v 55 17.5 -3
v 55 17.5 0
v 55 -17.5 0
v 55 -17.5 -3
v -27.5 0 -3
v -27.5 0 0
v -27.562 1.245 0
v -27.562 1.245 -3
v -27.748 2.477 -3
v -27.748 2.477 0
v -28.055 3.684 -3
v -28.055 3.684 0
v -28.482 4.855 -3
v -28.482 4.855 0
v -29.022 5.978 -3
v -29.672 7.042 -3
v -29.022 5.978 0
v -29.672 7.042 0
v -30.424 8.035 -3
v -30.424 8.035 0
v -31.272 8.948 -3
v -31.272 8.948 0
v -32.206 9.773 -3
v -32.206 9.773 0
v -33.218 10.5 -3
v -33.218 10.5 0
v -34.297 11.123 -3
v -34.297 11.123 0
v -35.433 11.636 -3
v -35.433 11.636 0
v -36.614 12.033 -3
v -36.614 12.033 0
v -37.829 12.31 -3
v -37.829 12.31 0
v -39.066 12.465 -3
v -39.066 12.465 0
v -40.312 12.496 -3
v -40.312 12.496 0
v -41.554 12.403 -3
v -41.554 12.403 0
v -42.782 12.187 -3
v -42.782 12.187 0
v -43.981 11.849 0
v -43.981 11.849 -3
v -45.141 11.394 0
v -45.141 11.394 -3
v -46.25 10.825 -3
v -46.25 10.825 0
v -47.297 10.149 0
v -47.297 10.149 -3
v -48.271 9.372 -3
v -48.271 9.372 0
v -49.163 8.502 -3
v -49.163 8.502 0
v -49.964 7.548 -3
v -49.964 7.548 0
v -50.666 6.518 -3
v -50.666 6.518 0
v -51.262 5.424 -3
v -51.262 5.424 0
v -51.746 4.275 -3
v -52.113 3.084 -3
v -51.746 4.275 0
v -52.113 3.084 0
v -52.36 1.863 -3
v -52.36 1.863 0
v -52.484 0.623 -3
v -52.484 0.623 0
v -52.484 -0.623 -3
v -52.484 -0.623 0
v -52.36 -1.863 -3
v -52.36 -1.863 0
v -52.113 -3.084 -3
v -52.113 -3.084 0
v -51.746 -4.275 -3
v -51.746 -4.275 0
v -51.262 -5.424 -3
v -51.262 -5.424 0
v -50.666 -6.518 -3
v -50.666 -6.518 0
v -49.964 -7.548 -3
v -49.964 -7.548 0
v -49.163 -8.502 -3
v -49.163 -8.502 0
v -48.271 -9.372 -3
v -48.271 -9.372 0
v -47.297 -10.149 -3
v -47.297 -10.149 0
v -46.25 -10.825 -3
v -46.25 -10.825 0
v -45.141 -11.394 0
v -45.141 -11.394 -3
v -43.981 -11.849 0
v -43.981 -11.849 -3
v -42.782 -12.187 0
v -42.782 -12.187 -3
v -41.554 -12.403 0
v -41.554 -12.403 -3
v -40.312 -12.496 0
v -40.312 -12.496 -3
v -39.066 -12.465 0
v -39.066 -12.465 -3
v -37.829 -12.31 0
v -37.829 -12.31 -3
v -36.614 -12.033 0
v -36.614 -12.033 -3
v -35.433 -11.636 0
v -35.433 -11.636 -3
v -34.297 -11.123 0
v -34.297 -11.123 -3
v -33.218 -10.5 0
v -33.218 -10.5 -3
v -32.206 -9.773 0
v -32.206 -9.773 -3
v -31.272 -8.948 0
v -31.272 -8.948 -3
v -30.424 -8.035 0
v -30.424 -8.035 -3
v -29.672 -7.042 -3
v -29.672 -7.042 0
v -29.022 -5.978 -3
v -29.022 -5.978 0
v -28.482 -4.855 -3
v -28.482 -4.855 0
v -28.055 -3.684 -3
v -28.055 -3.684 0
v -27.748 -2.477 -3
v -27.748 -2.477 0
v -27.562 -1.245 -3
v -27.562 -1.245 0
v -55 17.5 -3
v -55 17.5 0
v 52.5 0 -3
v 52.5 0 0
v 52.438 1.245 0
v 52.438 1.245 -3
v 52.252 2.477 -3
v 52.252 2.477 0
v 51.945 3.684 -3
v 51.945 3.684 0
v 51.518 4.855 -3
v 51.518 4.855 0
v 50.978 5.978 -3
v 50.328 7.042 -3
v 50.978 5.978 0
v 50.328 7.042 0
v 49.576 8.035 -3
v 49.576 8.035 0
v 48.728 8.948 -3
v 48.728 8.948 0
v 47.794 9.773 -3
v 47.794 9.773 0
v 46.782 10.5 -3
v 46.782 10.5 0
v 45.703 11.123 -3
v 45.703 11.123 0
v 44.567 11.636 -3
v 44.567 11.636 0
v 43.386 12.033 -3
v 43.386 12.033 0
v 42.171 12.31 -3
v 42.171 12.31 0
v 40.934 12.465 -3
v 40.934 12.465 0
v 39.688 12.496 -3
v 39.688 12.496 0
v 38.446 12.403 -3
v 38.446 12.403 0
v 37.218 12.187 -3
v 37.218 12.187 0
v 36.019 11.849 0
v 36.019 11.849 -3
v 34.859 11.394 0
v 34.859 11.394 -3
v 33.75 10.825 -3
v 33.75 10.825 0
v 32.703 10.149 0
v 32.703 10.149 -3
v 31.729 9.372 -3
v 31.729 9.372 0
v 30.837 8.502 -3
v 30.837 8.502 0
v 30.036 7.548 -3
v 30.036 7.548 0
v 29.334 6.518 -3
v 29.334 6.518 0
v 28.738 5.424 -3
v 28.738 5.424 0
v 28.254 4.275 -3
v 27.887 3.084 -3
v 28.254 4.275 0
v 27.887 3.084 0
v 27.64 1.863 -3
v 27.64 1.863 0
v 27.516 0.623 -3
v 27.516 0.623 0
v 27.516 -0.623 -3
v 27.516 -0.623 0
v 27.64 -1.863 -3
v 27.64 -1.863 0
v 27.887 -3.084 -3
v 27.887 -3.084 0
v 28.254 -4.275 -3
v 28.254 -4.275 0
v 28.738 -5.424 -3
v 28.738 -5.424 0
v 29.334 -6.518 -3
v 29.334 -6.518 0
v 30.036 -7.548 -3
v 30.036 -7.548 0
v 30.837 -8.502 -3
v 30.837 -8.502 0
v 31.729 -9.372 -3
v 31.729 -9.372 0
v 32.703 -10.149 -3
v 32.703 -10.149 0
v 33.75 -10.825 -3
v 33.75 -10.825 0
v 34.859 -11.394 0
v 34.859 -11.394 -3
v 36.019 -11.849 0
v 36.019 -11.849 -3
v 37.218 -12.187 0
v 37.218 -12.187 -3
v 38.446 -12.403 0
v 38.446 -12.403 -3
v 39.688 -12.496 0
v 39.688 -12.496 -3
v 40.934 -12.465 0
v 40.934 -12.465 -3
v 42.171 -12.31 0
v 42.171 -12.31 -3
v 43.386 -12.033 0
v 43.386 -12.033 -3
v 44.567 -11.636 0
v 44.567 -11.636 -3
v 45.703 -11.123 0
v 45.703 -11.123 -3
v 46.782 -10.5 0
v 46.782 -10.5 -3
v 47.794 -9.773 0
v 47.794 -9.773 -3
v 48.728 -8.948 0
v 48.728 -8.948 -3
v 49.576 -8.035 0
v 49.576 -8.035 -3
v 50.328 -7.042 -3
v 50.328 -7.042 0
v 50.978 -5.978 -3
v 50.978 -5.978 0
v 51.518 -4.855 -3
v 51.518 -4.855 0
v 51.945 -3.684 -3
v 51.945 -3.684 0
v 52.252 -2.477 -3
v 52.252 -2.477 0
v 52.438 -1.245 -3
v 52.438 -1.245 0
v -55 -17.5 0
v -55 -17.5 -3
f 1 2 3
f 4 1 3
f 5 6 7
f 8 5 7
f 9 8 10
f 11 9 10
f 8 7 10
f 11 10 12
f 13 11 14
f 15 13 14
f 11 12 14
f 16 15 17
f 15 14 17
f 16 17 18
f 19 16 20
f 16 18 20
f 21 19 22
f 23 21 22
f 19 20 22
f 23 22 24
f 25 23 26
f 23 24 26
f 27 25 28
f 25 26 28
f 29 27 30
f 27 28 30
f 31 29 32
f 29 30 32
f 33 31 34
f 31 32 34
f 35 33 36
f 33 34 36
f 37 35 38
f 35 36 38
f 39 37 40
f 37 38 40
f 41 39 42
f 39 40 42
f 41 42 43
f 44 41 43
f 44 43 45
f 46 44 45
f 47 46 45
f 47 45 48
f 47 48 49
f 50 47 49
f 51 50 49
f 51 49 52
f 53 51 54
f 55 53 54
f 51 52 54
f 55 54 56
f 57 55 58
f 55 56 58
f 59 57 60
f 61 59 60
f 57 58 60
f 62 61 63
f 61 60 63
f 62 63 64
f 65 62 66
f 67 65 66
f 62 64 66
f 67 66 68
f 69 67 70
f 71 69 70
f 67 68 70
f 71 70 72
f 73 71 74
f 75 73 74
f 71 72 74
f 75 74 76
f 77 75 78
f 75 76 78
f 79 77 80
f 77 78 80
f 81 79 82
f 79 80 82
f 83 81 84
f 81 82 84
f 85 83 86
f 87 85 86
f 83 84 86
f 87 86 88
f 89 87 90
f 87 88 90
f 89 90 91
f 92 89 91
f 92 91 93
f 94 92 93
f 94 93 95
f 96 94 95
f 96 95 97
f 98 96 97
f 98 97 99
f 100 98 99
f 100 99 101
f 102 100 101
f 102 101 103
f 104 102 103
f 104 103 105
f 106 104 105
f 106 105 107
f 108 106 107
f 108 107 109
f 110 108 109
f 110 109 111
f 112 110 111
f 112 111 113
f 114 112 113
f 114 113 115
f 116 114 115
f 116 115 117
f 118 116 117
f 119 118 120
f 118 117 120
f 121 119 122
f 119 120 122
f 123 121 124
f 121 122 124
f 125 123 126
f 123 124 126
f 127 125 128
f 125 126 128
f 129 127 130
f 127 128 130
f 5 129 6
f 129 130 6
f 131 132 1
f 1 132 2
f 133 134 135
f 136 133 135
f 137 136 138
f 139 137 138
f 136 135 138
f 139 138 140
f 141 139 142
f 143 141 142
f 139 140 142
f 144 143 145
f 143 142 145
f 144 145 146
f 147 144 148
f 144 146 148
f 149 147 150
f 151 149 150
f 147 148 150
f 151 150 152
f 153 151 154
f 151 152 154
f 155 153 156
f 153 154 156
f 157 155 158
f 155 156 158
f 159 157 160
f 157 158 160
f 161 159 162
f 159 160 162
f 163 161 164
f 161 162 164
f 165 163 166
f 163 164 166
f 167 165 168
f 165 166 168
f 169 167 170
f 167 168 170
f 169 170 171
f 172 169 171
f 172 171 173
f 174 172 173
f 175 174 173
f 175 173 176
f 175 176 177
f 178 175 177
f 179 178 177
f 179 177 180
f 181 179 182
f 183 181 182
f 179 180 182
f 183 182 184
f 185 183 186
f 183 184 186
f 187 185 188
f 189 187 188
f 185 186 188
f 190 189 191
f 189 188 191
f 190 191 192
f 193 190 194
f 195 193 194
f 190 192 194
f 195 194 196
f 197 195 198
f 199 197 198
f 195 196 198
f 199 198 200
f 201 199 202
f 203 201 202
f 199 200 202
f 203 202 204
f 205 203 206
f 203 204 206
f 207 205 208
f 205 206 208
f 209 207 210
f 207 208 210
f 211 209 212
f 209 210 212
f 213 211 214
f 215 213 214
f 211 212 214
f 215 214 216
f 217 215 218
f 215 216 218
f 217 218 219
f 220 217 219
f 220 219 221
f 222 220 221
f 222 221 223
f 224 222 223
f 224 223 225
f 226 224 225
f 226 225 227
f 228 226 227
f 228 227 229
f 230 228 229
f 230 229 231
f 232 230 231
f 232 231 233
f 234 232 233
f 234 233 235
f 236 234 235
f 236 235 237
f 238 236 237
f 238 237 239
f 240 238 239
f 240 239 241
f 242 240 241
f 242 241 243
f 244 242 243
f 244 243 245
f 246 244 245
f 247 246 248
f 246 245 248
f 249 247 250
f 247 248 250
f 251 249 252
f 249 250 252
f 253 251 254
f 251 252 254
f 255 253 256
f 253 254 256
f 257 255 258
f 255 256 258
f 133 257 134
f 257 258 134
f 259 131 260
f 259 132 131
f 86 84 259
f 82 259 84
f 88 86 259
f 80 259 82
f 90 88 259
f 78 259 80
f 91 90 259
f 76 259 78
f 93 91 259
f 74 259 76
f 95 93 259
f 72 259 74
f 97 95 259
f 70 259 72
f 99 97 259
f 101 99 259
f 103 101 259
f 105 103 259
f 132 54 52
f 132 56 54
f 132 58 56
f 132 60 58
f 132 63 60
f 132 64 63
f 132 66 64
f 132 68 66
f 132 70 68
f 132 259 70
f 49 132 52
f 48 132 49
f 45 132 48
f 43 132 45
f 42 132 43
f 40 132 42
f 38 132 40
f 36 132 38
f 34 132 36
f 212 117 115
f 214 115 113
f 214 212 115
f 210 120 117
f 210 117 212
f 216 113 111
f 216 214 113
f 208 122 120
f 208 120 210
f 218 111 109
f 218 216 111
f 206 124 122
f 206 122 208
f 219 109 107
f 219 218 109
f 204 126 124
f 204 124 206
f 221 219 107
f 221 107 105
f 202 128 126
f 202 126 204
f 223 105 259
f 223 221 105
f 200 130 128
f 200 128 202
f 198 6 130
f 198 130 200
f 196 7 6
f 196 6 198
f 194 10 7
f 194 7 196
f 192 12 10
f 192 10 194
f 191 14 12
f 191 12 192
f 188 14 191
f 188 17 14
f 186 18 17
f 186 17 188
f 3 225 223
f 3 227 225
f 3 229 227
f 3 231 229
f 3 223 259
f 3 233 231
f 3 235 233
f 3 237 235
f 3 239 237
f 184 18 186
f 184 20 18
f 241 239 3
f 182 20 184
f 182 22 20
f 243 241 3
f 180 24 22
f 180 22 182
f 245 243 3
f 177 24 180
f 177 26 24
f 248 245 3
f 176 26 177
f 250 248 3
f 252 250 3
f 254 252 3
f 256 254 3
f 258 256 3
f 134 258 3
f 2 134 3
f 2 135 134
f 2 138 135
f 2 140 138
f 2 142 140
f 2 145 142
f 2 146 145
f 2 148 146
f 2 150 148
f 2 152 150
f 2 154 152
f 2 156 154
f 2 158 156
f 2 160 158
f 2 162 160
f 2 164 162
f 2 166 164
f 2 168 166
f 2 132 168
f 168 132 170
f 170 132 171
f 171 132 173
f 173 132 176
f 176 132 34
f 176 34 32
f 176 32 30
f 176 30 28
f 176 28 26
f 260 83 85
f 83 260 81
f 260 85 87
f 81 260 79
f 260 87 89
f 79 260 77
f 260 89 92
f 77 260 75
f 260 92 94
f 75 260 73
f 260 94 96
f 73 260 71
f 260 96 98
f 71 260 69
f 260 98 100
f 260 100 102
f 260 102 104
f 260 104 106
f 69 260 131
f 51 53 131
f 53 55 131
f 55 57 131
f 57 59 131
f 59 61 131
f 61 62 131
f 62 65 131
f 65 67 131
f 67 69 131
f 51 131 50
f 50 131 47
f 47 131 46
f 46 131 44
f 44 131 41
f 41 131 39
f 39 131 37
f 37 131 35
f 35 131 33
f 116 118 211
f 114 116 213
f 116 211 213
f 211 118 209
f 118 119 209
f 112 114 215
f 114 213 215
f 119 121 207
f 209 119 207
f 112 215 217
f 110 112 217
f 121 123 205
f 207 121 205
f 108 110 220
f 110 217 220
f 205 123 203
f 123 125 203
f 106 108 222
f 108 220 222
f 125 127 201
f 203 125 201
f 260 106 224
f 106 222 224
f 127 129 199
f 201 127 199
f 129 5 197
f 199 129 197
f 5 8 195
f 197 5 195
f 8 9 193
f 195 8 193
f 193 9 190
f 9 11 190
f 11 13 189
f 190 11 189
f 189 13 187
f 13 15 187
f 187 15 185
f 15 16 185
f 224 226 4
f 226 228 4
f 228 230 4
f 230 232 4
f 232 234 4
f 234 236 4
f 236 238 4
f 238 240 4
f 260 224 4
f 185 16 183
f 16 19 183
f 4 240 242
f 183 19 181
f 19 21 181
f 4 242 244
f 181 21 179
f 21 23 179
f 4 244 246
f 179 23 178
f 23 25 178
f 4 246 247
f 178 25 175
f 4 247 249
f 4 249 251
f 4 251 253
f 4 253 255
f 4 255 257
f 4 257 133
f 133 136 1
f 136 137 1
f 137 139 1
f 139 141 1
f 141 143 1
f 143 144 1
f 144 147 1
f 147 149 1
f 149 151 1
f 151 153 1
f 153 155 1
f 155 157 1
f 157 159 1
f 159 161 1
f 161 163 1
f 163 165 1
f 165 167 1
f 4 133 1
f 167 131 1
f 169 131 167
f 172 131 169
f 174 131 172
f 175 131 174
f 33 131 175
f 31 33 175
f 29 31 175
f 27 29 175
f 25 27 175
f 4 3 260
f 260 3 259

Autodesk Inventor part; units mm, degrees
ref_plane "YZ Plane" through (0, 0, 0) normal (1, 0, 0) x (0, 1, 0)
ref_plane "XZ Plane" through (0, 0, 0) normal (0, 1, 0) x (-1, 0, 0)
ref_plane "XY Plane" through (0, 0, 0) normal (0, 0, 1) x (1, 0, 0)
sketch "Sketch1" plane through (0, 0, 0) normal (0, 0, 1) x (1, 0, 0)
  line L0 (-55, 17.5) -> (-55, -17.5)
  line L1 (-55, 17.5) -> (55, 17.5)
  line L2 (55, 17.5) -> (55, -17.5)
  line L3 (55, -17.5) -> (-55, -17.5)
  point P0 (0, 0)
  point P1 (-55, 0)
  dimension "d0" = 35
  dimension "d1" = 55
  dimension "d2" = 110
  dimension "d3" = 35
extrude "Extrusion1" add sketch "Sketch1" against normal blind 3
sketch "Sketch2" plane through (0, 0, 0) normal (0, 0, 1) x (1, 0, 0)
  circle A0 centre (40, 0) radius 12.5
  circle A1 centre (-40, 0) radius 12.5
  point P0 (0, 0)
  dimension "d6" = 25
  dimension "d7" = 40
  dimension "d8" = 25
  dimension "d9" = 40
extrude "Extrusion2" cut sketch "Sketch2" against normal through all
properties part number "Elasma_diskou2"
